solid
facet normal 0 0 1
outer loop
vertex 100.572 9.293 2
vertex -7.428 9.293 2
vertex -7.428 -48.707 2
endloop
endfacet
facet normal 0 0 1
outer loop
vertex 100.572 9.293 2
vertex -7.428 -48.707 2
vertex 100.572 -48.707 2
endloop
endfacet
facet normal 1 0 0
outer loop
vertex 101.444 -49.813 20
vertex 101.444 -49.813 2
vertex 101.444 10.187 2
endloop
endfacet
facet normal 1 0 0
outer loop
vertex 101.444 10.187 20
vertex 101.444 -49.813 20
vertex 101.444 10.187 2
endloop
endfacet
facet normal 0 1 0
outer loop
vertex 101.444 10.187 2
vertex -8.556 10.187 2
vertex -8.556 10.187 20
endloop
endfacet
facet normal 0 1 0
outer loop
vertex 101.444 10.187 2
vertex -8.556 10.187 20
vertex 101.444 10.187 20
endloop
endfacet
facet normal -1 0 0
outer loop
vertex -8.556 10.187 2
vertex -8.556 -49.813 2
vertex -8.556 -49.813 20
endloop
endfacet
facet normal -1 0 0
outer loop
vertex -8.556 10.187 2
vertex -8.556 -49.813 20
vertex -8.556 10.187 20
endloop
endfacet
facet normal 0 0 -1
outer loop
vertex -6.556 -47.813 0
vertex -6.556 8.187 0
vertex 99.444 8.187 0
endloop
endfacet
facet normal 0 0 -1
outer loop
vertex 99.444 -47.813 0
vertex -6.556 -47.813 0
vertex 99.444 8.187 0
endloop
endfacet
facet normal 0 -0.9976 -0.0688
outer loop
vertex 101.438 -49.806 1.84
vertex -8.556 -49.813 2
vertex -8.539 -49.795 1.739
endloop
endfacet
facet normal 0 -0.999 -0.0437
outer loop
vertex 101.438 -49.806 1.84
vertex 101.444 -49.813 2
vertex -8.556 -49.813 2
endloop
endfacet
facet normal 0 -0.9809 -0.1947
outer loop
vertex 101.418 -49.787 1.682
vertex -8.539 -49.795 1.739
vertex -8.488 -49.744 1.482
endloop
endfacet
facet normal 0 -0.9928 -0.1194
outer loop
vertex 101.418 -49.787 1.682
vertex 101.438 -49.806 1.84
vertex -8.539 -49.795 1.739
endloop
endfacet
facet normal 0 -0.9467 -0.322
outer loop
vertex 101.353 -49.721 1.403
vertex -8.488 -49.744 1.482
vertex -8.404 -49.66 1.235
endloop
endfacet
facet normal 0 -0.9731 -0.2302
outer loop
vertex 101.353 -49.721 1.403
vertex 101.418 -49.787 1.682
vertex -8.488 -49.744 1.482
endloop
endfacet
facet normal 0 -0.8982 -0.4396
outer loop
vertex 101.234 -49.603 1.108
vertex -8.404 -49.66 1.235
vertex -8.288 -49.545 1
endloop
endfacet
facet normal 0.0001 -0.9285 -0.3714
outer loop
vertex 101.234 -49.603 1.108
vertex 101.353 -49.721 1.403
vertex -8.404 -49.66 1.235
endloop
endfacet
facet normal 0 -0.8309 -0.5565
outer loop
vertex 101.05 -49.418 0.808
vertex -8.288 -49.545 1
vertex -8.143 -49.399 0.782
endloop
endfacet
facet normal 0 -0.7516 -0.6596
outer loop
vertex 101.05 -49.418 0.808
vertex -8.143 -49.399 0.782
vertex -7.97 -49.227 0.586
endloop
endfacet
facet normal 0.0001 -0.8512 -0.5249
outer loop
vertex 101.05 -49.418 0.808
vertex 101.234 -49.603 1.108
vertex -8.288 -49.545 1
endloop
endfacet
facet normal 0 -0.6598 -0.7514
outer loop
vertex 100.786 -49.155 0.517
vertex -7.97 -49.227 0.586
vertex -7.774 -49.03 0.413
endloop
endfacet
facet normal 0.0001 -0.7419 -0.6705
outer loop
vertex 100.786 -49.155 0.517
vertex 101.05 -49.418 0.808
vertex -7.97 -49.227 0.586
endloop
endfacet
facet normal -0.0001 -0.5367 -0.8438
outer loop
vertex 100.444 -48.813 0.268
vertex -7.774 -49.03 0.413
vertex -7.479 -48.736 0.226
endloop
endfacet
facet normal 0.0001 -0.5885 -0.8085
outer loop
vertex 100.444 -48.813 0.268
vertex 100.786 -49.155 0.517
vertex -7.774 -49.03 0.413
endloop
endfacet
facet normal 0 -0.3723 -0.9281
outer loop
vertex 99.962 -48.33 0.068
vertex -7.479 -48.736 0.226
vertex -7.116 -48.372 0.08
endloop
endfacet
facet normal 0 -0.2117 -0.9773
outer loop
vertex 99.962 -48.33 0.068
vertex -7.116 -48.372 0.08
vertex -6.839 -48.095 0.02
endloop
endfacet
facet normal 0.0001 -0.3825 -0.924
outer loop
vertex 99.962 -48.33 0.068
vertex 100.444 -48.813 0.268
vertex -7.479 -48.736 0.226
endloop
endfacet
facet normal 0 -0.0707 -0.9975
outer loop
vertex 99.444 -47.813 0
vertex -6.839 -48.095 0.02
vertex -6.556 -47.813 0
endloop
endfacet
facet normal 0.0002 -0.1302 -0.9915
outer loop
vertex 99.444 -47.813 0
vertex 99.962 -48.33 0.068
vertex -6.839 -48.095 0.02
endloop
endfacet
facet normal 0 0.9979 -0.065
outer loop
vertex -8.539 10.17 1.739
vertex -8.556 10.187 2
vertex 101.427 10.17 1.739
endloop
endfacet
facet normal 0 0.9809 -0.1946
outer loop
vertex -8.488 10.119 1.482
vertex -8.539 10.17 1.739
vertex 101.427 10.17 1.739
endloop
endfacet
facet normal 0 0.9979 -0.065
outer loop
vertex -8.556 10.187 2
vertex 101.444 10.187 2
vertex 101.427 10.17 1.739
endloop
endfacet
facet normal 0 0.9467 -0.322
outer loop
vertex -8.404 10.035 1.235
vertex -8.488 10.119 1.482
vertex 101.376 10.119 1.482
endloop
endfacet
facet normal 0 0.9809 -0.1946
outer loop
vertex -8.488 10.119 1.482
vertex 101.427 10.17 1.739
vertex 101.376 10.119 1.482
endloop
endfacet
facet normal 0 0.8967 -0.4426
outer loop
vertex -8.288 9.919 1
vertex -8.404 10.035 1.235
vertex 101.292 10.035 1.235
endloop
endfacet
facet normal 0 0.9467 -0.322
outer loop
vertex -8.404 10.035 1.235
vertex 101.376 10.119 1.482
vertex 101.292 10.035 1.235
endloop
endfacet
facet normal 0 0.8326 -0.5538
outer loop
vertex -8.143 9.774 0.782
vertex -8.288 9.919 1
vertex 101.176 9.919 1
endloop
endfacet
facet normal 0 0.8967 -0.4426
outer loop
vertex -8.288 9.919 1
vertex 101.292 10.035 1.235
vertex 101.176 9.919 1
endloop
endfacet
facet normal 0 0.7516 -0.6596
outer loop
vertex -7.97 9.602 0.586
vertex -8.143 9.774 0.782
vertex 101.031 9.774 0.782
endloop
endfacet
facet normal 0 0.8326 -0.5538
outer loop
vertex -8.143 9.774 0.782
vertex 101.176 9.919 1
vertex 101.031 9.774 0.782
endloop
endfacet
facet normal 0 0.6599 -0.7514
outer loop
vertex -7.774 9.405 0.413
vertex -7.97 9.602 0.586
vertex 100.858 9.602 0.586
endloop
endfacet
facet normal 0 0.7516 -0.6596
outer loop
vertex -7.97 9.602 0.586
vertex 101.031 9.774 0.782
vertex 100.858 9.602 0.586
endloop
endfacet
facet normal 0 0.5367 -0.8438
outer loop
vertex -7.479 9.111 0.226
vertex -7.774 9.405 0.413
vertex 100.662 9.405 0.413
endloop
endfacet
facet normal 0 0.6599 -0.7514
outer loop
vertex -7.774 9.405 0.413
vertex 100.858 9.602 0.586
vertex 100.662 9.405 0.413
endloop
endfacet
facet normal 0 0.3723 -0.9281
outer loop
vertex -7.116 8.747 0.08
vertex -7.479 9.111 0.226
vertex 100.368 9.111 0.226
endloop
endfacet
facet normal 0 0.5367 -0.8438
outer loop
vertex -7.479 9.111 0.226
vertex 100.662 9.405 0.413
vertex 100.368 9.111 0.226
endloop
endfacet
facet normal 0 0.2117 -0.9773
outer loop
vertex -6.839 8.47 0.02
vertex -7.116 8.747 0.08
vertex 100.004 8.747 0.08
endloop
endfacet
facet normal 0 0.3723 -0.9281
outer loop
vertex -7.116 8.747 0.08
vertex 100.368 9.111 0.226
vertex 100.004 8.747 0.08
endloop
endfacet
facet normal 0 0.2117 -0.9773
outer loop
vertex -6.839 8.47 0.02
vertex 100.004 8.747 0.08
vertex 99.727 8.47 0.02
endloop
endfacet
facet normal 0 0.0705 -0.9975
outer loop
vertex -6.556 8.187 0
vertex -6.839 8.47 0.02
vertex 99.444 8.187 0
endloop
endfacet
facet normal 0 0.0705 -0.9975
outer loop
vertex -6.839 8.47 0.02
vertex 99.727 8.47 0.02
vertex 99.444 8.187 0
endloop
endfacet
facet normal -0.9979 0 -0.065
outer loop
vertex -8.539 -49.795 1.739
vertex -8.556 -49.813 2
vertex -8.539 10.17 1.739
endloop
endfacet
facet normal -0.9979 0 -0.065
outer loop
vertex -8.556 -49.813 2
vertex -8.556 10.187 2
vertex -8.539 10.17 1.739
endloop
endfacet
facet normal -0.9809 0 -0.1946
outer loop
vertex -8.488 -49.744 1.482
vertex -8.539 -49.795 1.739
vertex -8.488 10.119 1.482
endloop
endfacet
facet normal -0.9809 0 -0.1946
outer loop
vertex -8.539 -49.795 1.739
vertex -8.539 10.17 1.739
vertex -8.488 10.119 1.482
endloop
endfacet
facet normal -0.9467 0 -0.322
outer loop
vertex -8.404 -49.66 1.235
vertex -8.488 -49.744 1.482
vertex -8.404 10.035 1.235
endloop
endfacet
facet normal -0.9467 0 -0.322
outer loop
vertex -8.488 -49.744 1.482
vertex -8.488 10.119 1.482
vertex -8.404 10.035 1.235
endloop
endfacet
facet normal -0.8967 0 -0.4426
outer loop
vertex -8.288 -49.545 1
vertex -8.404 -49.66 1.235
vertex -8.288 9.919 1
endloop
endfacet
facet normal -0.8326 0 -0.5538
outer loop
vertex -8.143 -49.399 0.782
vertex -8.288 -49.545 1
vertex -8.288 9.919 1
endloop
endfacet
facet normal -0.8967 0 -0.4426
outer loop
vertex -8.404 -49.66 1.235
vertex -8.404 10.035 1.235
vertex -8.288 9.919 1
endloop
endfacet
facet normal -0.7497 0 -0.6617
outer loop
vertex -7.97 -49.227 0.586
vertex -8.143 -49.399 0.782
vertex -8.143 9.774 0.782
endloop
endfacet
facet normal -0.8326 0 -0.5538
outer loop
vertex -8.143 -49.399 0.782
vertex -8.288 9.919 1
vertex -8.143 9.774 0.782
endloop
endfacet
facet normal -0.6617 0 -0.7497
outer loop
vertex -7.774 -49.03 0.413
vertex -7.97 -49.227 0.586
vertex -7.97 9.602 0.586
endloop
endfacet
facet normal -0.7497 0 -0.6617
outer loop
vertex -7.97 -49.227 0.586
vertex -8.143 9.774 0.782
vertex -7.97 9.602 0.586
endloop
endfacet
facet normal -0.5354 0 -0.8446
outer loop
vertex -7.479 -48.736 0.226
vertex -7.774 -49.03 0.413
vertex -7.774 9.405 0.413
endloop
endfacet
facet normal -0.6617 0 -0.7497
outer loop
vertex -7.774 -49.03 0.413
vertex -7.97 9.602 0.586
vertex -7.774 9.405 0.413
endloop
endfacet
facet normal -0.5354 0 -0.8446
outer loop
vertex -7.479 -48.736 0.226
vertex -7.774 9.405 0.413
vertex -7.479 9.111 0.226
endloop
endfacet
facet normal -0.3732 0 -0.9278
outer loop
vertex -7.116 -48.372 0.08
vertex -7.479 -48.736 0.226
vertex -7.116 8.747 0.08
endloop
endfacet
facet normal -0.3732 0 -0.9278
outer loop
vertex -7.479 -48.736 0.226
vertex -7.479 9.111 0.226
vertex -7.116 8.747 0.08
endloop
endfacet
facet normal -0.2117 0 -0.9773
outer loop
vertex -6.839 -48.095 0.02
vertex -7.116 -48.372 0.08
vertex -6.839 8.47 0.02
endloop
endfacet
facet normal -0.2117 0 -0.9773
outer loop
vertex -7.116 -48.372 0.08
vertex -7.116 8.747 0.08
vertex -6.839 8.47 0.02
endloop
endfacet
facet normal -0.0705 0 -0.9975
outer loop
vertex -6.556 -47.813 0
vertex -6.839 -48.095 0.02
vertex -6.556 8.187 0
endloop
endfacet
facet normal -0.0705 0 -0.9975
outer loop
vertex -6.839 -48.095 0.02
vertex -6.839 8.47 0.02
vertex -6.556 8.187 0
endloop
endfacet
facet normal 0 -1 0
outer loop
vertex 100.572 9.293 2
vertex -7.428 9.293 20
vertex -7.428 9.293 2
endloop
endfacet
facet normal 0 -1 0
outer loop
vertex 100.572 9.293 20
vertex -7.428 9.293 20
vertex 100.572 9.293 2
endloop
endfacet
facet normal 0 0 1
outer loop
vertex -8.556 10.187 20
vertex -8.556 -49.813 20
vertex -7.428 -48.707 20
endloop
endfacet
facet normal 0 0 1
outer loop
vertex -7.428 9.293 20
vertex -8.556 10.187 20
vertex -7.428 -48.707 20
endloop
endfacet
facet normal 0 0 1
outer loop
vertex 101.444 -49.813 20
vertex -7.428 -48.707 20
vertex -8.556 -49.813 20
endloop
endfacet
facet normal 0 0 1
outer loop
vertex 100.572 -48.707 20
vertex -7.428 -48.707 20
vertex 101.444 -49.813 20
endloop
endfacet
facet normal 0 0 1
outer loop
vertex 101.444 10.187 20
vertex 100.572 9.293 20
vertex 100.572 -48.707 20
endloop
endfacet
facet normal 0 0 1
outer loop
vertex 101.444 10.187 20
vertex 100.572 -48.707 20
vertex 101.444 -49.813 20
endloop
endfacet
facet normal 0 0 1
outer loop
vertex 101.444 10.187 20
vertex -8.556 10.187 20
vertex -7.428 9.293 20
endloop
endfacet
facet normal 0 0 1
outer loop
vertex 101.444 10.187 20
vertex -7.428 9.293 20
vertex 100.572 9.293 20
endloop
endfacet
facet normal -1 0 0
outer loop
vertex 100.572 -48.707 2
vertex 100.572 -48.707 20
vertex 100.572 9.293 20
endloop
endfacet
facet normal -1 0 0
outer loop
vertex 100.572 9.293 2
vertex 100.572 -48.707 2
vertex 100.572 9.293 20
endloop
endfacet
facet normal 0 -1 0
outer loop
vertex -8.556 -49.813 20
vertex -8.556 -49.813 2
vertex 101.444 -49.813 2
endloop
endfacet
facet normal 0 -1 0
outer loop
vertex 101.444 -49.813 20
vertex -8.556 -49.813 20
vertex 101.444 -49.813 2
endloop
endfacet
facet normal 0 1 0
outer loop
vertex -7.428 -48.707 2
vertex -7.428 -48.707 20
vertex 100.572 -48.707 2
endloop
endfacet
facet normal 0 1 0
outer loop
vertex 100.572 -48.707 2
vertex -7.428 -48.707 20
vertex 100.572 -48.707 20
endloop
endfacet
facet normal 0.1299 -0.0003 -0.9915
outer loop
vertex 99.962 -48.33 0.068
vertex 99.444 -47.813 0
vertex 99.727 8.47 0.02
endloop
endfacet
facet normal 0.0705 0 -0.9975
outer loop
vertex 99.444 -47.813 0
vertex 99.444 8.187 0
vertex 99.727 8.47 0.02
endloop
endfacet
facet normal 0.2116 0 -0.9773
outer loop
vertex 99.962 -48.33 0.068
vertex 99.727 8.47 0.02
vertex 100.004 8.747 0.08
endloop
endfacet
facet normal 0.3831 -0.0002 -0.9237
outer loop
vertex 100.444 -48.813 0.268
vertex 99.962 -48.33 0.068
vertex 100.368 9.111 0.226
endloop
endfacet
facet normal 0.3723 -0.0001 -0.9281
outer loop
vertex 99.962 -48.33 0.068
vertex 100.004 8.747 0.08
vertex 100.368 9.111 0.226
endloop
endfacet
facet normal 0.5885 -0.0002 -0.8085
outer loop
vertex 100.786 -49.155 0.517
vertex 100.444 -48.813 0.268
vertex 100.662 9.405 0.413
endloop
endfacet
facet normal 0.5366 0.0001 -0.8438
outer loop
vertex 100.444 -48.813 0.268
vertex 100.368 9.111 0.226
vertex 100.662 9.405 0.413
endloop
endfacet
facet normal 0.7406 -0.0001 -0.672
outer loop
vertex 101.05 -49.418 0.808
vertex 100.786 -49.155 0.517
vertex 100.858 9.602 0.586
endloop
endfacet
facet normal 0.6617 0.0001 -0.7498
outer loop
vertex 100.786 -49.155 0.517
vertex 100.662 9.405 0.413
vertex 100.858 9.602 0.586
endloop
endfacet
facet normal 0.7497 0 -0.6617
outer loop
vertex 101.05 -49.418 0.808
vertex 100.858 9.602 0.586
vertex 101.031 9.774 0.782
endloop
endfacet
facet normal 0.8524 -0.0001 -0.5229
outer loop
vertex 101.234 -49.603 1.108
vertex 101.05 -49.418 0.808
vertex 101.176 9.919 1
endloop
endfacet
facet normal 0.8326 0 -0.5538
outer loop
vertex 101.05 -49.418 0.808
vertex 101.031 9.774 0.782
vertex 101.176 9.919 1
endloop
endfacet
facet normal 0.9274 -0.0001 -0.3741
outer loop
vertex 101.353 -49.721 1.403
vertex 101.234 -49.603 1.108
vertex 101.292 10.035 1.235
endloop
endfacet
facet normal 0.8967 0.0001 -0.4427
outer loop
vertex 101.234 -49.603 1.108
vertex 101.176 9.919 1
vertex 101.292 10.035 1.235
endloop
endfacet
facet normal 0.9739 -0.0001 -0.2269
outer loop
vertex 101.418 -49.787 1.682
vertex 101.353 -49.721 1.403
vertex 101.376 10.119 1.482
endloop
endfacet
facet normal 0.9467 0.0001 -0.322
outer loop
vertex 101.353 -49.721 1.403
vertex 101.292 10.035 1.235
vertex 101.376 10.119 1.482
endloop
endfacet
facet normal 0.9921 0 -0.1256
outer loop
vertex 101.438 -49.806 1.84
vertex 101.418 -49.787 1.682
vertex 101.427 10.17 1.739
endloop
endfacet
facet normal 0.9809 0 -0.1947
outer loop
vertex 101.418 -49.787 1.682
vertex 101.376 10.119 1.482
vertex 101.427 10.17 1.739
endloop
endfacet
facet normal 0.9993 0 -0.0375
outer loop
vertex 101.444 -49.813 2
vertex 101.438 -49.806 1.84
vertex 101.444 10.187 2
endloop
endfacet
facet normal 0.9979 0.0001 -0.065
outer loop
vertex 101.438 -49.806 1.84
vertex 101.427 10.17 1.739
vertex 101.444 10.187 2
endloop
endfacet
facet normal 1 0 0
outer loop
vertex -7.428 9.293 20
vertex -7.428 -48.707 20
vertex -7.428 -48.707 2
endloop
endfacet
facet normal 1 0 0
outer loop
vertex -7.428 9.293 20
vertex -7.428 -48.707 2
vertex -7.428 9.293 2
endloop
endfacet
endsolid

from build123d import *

# Parameters (mm, degrees)
SKETCH_W     = 110
SKETCH_H     = 60
PAD_DEPTH    = 20
SKETCH001_W  = 108
SKETCH001_H  = 58
POCKET_DEPTH = 18
FILLET_R     = 2


with BuildPart() as part:
    # Sketch → Pad (new body)
    with BuildSketch(Plane.XY):
        with Locations((46.444008, -19.812599)):
            Rectangle(SKETCH_W, SKETCH_H)
    extrude(amount=PAD_DEPTH)

    # Sketch001 (on Face6 of Pad) → Pocket (cut)
    with BuildSketch(Plane.XY.offset(20)):
        with Locations((46.57238, -19.707021)):
            Rectangle(SKETCH001_W, SKETCH001_H)
    extrude(amount=-POCKET_DEPTH, mode=Mode.SUBTRACT)

    # Fillet
    fillet_edges = [part.edges().sort_by_distance(p)[0] for p in [
        (46.444008, 10.187401, 0),
        (101.444008, -19.812599, 0),
        (46.444008, -49.812599, 0),
        (-8.555992, -19.812599, 0),
    ]]
    fillet(fillet_edges, radius=FILLET_R)


solid = part.part
